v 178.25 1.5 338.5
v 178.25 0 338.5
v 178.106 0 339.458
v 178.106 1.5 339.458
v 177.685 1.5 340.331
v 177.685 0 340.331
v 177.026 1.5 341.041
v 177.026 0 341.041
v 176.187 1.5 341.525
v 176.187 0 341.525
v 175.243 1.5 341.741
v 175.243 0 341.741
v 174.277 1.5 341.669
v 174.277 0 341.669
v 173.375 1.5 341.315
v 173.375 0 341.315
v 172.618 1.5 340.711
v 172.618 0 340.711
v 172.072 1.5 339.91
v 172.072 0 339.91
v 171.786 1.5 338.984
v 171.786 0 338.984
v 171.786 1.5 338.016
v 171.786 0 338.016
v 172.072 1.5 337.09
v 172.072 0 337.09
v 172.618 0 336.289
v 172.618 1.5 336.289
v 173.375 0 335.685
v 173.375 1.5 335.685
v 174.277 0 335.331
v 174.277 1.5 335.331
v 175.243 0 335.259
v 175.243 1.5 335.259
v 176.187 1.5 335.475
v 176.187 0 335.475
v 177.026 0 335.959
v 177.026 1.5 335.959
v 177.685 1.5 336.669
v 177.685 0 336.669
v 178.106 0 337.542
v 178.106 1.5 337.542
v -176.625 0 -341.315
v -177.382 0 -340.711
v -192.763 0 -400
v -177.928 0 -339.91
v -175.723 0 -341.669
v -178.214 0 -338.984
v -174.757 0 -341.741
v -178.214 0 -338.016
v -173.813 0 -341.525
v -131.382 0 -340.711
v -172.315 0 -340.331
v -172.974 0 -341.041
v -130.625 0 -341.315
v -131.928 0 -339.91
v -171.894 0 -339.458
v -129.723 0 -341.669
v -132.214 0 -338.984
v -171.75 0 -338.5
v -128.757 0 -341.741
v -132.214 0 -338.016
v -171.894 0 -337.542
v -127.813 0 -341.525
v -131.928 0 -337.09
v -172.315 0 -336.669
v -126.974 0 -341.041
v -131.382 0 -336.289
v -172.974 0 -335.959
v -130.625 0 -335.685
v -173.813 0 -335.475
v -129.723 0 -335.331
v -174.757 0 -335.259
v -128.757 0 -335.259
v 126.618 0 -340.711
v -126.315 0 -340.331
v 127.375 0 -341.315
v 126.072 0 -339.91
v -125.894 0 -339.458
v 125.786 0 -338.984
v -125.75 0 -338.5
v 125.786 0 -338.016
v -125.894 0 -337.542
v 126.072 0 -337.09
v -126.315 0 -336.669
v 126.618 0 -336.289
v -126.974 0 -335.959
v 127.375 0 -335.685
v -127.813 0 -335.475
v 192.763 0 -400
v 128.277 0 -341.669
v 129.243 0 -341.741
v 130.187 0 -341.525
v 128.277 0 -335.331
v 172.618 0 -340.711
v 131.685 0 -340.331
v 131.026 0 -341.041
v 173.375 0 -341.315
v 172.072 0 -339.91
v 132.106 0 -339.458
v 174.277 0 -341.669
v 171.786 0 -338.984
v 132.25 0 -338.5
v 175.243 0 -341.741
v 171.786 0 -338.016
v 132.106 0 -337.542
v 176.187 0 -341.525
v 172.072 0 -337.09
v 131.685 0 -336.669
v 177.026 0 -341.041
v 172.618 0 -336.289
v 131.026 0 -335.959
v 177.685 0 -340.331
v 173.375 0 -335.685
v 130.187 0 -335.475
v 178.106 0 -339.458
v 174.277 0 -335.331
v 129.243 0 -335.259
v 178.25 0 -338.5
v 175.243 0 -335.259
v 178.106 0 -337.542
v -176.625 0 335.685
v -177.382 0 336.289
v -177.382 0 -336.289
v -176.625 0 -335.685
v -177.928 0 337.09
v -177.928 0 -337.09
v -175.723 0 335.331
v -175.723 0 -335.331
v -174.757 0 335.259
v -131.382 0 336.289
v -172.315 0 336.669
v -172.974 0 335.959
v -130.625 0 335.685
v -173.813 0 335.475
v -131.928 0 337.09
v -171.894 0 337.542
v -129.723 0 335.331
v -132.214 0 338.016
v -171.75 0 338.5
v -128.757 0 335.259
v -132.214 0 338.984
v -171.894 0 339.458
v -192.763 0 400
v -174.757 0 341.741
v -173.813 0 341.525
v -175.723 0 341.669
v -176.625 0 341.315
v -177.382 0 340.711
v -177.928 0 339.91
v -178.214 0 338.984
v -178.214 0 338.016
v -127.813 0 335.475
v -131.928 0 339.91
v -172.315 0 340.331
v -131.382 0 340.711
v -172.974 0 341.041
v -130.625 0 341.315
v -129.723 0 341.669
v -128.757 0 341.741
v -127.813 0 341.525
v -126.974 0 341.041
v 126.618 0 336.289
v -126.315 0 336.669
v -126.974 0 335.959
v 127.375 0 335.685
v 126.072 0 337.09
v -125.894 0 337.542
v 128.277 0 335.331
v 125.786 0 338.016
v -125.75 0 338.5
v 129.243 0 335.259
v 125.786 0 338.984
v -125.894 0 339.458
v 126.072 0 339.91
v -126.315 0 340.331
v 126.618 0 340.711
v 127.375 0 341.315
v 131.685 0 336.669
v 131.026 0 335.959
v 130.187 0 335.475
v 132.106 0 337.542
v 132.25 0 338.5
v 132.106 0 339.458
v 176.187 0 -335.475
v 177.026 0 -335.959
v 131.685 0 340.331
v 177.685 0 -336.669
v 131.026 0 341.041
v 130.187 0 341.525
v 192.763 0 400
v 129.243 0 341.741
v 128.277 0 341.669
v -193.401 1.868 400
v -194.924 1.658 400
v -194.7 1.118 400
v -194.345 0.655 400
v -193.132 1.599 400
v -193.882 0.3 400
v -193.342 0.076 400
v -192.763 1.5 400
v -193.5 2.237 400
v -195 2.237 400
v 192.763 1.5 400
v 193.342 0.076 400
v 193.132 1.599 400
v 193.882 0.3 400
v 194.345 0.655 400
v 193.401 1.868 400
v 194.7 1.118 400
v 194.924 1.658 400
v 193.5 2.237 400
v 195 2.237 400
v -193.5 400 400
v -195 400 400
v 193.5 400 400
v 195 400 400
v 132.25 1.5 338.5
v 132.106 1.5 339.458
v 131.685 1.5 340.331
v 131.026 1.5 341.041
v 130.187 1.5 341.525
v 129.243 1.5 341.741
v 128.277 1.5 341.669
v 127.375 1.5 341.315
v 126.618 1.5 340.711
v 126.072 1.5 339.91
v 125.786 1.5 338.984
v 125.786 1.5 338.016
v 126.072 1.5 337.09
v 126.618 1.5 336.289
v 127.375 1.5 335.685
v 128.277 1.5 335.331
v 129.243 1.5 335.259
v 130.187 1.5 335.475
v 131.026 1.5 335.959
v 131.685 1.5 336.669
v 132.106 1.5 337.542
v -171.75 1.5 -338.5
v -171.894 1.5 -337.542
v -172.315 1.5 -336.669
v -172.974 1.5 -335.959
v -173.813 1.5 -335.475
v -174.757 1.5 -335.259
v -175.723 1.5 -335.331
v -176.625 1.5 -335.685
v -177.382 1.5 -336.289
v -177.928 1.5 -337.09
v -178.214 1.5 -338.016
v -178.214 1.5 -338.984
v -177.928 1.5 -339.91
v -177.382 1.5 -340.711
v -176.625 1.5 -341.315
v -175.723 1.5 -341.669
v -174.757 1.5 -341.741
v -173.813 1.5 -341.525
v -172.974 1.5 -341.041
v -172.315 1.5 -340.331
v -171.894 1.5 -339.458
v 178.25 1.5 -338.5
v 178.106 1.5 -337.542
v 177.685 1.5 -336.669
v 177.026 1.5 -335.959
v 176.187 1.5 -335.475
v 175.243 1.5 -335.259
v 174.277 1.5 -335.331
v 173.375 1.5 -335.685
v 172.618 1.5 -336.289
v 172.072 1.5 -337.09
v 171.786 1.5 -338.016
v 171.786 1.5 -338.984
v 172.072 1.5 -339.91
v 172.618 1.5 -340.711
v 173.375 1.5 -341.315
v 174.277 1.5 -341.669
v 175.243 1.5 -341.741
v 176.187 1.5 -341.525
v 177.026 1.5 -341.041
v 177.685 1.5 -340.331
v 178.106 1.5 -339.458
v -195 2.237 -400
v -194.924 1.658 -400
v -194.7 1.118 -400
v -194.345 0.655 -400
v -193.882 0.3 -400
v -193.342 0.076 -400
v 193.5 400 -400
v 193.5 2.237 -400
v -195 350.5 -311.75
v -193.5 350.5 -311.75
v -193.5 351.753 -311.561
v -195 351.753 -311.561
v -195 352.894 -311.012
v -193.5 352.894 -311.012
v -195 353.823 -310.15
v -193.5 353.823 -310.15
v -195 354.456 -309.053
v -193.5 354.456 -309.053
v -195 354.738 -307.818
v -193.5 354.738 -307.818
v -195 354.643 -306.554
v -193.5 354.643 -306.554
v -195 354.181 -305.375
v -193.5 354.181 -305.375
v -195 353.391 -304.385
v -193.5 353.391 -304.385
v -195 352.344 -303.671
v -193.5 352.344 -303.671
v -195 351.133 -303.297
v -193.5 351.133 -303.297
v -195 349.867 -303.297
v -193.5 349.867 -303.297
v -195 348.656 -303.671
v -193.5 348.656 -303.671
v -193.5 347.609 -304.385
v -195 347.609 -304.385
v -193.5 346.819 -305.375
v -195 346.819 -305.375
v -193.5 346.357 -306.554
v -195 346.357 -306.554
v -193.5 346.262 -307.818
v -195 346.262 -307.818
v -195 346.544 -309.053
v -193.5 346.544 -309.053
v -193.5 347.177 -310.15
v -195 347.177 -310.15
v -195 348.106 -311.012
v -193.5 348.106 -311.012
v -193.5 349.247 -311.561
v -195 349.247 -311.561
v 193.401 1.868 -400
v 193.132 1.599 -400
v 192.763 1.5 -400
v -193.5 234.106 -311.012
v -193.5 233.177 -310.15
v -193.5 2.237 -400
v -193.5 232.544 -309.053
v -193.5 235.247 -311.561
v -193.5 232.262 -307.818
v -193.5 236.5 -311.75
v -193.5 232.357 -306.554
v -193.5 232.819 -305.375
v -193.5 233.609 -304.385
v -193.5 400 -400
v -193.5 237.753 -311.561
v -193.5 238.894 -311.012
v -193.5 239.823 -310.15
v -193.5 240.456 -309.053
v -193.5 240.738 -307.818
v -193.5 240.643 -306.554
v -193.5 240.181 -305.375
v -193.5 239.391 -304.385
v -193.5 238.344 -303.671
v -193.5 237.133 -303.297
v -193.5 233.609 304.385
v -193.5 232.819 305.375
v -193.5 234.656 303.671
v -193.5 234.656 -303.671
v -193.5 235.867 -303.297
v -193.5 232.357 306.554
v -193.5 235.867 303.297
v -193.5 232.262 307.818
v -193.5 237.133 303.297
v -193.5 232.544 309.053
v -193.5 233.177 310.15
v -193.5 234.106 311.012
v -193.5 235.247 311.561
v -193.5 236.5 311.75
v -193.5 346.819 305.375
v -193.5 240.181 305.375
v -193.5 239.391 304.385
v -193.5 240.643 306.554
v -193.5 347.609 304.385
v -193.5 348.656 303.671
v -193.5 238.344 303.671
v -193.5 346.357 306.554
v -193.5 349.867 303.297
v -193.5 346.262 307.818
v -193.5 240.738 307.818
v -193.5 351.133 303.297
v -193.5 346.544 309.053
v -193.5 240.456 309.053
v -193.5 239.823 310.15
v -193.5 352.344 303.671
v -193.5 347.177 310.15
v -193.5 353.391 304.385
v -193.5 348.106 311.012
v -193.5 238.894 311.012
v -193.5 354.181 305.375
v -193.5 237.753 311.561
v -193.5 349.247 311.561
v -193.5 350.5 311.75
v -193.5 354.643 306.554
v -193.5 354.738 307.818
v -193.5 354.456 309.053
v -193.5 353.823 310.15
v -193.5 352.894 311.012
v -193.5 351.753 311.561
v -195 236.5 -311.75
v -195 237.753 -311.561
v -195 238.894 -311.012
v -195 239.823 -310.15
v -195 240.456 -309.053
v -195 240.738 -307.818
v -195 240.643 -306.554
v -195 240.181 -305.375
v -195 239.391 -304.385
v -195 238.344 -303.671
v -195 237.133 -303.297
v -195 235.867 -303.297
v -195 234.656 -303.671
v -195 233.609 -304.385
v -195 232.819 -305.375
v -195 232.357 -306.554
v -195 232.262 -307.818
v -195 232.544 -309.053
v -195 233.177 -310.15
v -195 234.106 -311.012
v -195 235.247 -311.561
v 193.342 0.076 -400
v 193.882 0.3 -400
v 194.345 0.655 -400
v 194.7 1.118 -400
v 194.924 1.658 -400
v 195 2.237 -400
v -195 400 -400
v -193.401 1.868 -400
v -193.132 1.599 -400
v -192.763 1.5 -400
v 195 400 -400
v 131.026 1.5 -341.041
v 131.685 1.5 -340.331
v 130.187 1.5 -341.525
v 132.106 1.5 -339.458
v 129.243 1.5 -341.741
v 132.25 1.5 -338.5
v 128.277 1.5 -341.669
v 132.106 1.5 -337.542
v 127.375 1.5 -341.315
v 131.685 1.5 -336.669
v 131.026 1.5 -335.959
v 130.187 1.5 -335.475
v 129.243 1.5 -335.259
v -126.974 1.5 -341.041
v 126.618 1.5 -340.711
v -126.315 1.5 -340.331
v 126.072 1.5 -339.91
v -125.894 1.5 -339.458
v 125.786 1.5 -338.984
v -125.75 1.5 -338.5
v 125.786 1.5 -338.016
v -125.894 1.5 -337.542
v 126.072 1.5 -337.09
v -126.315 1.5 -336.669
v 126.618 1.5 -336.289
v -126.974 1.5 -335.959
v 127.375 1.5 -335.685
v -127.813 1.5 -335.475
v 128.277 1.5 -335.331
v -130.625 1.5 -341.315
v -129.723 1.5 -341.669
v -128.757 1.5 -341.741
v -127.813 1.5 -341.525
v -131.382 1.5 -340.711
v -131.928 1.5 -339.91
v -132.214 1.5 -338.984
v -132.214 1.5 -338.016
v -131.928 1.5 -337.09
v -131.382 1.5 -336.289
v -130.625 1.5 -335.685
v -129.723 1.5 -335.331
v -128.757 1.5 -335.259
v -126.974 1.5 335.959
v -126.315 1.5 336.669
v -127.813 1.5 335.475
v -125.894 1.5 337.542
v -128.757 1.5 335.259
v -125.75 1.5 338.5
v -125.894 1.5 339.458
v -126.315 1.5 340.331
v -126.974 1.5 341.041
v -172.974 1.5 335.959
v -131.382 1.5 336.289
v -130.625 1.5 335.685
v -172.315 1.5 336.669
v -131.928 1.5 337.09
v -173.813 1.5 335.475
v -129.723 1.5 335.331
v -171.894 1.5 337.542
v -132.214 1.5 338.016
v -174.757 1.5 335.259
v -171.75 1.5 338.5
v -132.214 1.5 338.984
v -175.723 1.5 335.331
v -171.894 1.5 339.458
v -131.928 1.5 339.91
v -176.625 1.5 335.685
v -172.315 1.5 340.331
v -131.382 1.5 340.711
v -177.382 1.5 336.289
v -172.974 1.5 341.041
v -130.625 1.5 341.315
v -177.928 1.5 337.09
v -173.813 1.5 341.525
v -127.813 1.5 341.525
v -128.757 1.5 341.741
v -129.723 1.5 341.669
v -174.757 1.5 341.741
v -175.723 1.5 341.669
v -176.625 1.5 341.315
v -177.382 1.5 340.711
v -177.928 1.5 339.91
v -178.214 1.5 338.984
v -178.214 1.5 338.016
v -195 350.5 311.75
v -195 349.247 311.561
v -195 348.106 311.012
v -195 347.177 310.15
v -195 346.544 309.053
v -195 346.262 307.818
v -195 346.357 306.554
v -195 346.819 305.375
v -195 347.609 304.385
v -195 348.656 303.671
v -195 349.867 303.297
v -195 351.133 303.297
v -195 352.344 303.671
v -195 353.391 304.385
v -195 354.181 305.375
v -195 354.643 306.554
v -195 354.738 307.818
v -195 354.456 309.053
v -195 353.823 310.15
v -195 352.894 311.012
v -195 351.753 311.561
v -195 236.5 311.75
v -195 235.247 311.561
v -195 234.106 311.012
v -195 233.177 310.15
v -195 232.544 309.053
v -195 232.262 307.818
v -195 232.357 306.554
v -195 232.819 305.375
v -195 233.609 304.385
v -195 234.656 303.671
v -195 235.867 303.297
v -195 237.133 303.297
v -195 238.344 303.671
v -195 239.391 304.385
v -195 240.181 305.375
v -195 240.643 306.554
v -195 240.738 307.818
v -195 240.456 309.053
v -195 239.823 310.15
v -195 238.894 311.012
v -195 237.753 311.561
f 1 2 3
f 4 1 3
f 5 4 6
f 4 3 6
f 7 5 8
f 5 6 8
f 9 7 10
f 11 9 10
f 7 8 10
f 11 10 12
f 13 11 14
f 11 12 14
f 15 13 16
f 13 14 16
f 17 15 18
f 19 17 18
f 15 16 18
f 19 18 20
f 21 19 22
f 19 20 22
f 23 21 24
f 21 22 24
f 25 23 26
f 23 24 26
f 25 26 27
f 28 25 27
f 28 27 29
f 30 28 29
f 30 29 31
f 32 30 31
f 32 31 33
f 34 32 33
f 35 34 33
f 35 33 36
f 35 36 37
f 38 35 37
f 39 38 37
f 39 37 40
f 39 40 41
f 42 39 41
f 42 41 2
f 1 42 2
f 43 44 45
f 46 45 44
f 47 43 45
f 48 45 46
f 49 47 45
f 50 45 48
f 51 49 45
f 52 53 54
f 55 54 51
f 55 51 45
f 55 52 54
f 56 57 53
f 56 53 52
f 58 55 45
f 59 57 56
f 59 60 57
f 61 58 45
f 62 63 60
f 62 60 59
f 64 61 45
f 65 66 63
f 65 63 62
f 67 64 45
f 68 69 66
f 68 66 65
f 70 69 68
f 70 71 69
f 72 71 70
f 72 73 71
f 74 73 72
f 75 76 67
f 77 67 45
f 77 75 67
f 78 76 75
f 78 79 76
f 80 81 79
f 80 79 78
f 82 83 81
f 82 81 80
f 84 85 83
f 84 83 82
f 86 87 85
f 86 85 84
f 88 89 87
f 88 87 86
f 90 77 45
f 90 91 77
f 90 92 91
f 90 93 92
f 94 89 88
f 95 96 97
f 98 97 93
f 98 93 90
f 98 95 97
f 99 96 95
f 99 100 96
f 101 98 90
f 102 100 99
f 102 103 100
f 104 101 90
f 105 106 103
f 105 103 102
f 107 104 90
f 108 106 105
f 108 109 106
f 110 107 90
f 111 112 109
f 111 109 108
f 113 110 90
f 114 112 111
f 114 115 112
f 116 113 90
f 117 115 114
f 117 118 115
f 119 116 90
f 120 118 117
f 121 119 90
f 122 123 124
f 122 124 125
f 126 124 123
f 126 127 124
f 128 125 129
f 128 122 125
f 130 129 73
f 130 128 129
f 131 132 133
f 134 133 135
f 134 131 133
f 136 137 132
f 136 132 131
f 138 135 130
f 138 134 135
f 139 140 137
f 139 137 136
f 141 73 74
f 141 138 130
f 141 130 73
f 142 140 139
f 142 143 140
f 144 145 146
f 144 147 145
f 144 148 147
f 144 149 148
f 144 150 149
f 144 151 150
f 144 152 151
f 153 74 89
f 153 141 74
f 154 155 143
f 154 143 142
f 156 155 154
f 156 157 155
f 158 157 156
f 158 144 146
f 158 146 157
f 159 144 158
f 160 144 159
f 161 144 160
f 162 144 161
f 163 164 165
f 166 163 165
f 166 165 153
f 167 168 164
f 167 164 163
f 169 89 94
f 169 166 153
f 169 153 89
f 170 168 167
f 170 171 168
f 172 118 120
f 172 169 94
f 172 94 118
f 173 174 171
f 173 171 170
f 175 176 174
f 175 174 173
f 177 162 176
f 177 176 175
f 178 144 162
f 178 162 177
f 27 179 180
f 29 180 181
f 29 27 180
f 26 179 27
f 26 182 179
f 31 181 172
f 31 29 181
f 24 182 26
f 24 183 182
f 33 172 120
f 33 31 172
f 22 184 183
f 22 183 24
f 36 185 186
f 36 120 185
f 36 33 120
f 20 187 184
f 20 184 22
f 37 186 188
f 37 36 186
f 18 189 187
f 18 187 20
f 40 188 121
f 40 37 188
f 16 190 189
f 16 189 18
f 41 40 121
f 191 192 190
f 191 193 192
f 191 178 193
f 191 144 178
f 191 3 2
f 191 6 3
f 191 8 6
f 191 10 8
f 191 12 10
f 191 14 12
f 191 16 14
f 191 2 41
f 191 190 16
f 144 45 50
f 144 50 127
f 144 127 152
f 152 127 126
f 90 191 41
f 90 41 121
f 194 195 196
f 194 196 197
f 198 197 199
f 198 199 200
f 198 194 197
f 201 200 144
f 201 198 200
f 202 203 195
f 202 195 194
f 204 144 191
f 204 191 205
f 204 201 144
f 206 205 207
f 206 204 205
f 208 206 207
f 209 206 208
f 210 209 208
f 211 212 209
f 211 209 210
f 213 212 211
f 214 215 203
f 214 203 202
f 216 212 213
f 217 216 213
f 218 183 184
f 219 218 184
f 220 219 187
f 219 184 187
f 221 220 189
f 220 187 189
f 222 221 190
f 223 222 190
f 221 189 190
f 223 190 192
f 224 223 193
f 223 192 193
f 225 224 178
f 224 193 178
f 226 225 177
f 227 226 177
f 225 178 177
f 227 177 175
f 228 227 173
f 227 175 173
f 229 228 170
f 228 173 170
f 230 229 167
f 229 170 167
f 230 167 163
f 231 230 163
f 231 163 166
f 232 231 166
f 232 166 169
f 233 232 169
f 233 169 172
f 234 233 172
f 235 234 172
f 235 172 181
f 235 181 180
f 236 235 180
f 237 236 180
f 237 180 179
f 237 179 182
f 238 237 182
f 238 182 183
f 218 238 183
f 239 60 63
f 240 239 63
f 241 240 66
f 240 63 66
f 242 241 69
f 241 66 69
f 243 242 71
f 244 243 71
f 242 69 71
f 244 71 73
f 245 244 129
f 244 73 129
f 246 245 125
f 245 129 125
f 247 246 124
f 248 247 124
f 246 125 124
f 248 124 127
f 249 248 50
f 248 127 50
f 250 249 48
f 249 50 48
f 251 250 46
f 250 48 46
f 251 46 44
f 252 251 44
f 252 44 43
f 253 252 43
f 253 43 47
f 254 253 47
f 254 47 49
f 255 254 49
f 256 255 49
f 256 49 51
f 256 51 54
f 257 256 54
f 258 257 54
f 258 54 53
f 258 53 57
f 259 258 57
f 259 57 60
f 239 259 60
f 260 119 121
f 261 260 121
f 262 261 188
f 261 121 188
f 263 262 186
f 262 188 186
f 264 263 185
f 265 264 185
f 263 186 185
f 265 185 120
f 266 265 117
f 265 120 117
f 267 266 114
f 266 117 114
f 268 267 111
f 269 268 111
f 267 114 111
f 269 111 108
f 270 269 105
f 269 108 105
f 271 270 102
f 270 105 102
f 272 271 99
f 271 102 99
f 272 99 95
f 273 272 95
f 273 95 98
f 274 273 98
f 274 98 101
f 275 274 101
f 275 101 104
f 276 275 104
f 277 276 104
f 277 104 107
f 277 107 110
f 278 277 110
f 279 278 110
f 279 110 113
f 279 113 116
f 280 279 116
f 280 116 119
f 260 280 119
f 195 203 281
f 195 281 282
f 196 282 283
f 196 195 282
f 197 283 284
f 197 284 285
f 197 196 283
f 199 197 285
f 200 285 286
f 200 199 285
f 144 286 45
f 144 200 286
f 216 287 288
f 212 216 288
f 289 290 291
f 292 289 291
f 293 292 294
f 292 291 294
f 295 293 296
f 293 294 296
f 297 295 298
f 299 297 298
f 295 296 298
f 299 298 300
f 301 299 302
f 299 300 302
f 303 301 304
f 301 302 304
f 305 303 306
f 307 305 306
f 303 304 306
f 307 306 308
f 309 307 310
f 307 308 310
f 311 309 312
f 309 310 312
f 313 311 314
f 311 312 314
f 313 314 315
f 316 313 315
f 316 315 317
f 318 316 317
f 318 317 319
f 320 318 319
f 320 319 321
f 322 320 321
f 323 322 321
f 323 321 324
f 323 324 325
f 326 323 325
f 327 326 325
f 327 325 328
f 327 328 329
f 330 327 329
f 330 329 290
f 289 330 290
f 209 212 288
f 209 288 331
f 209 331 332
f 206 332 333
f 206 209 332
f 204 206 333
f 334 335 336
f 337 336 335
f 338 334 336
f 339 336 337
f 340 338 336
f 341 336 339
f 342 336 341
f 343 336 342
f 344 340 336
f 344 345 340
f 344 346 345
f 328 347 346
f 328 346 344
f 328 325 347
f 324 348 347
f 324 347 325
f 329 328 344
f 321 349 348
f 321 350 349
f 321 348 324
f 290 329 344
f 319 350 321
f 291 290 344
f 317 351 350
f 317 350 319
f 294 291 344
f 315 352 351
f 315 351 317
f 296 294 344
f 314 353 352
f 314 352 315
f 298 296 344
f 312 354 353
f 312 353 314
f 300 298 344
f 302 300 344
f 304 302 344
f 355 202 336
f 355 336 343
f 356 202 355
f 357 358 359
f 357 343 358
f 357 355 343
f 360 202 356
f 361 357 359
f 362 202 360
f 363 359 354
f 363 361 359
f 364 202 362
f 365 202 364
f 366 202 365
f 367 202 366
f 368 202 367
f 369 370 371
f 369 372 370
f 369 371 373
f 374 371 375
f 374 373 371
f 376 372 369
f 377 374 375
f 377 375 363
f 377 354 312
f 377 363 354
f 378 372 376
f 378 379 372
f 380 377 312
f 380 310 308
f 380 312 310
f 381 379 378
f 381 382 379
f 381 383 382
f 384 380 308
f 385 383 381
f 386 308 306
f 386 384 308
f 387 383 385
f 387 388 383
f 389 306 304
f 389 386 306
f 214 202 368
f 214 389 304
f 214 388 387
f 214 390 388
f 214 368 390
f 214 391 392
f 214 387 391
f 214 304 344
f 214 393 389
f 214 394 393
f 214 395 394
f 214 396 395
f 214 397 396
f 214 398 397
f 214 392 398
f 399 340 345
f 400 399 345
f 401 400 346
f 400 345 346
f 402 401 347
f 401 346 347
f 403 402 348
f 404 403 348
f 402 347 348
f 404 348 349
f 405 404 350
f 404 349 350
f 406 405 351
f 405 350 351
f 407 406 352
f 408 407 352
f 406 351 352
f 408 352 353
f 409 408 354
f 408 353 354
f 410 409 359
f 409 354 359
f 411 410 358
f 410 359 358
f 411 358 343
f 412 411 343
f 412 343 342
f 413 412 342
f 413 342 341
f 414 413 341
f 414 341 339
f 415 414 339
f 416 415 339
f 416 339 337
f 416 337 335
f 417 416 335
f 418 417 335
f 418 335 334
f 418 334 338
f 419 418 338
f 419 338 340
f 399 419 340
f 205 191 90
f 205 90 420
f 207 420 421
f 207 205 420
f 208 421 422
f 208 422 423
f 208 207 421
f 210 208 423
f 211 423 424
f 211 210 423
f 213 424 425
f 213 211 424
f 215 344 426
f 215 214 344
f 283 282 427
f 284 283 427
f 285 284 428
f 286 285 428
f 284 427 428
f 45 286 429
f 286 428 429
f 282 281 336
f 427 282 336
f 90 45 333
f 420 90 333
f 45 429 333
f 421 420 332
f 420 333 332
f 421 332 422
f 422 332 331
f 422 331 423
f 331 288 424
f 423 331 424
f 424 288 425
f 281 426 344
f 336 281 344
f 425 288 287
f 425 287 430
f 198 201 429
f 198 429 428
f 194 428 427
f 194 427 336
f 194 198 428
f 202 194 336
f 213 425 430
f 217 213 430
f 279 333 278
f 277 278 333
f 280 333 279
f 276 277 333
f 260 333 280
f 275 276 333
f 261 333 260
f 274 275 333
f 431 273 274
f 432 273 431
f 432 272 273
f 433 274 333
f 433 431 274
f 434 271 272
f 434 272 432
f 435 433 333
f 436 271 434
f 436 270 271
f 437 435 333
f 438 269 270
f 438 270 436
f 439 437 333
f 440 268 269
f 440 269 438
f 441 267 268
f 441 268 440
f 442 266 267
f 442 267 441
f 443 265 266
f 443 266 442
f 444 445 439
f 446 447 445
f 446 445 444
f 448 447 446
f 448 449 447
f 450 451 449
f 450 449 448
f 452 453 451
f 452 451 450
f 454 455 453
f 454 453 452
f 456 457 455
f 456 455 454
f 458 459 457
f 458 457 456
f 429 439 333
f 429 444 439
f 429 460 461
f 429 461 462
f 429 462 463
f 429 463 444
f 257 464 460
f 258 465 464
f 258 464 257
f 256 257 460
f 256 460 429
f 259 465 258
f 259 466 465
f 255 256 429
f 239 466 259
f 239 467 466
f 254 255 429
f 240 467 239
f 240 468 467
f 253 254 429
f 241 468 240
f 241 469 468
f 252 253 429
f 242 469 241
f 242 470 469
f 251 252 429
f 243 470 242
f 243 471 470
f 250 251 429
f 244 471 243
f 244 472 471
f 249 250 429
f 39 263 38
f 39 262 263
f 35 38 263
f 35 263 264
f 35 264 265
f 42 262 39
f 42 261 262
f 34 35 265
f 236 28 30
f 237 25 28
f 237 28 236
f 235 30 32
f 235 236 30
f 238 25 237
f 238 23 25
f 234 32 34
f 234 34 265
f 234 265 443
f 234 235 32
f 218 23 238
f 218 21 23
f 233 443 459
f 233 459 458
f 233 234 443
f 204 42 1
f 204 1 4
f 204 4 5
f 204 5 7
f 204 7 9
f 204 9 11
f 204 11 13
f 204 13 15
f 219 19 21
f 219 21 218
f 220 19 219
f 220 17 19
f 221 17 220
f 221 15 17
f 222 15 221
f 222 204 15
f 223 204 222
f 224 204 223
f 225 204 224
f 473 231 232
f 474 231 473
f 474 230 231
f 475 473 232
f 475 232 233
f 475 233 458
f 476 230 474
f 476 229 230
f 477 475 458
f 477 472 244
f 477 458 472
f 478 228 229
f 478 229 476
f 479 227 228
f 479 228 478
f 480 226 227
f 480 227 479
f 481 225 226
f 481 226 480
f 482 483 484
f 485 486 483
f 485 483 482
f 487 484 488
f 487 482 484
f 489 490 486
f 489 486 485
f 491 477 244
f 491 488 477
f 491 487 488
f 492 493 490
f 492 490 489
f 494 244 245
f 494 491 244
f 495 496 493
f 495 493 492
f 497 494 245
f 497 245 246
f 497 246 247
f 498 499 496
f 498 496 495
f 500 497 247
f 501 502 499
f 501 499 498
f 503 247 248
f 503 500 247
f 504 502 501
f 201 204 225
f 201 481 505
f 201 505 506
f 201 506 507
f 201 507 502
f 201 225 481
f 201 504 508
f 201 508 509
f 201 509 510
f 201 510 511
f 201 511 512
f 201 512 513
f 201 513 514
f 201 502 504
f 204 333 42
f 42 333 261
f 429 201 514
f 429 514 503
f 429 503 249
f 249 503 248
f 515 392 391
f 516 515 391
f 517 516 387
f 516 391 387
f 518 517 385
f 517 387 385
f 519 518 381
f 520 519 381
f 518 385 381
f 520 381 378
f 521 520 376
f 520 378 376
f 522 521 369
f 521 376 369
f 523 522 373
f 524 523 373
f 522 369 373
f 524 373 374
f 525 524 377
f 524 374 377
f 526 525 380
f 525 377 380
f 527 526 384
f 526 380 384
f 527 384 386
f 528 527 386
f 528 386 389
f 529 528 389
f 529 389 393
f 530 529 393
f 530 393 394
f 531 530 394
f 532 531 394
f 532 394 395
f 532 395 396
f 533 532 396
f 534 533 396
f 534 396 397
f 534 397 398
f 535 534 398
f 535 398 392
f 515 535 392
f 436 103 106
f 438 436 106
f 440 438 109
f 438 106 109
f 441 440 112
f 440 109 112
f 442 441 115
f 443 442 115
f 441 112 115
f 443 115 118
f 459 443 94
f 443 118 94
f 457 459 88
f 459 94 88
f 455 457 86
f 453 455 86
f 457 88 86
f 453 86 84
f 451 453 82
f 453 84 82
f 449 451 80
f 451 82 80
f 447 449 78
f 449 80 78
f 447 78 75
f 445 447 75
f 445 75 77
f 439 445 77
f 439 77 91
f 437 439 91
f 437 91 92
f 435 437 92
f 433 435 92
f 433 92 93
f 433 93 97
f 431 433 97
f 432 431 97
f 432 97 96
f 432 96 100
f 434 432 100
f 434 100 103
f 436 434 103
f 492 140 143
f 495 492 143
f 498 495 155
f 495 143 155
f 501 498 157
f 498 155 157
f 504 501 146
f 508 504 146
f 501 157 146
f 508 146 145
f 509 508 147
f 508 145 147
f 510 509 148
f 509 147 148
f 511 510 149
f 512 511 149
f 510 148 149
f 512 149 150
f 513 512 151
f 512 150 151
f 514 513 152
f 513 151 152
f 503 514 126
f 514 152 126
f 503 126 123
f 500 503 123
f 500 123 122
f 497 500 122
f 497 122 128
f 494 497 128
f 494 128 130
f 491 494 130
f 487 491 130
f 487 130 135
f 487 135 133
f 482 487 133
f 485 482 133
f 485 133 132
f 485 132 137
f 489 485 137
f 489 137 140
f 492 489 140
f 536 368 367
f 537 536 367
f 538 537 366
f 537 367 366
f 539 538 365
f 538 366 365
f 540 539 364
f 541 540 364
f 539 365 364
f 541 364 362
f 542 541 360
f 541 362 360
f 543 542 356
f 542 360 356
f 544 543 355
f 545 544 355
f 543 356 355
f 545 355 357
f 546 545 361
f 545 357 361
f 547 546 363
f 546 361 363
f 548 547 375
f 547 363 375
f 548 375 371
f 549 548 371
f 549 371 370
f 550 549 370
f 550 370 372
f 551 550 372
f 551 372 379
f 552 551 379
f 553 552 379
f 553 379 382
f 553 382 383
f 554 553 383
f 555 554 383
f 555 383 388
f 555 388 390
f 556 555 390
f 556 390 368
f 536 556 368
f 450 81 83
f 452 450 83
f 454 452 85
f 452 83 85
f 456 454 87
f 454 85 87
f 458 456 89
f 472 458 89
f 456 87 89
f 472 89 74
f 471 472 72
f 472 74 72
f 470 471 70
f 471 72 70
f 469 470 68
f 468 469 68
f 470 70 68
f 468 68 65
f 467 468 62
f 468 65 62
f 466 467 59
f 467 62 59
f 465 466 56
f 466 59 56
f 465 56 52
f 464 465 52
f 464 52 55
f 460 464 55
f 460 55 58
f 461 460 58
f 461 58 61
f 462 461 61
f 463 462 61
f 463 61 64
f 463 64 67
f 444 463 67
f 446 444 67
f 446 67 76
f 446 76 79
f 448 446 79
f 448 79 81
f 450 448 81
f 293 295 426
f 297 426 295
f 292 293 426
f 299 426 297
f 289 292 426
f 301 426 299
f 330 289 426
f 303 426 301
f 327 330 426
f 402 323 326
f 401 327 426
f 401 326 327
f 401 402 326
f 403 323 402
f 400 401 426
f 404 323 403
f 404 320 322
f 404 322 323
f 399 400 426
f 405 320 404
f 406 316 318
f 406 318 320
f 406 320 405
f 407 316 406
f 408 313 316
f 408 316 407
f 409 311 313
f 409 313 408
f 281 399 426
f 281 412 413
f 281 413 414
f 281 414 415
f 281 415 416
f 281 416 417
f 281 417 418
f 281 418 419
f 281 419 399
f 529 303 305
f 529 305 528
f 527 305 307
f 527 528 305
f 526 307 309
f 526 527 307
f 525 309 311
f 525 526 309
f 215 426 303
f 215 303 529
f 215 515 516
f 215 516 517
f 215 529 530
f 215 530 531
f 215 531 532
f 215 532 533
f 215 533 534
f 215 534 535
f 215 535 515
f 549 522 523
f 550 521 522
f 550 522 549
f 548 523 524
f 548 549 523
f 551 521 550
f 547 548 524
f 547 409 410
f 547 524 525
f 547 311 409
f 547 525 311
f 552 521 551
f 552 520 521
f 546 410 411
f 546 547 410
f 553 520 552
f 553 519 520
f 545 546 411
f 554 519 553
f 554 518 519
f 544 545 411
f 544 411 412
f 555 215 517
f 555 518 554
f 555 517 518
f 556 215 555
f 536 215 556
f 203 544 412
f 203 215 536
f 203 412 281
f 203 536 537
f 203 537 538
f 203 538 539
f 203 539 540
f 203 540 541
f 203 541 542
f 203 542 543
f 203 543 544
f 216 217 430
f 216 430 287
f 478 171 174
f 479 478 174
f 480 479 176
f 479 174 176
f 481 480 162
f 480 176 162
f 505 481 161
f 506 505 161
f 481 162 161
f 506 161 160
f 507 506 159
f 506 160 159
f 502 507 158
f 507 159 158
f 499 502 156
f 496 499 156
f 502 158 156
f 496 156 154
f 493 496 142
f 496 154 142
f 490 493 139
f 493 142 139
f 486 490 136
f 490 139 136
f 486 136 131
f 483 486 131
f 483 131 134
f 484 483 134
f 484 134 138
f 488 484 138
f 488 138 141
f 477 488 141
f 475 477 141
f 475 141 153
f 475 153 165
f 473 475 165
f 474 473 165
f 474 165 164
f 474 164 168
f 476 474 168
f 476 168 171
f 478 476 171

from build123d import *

# Parameters (mm, degrees)
TABAN_FLAN_1_DEPTH    = 400
IZIM2_R               = 4.25
KES_EKSTR_ZYON1_DEPTH = 10
IZIM3_R               = 3.25
KES_EKSTR_ZYON2_DEPTH = 10


# Sheet-metal steps are written as plain solids
with BuildPart() as part:
    # Çizim1 → Taban-Flanş1 (new, symmetric)
    with BuildSketch(Plane.XY):
        with BuildLine():
            Line((-195, 400), (-195, 2.2366))
            ThreePointArc((-195, 2.2366), (-194.344915027, 0.655084973), (-192.7634, 0))
            Line((-192.7634, 0), (192.7634, 0))
            ThreePointArc((192.7634, 0), (194.344915027, 0.655084973), (195, 2.2366))
            Line((195, 2.2366), (195, 400))
            Line((195, 400), (193.5, 400))
            Line((193.5, 400), (193.5, 2.2366))
            ThreePointArc((193.5, 2.2366), (193.284254855, 1.715745145), (192.7634, 1.5))
            Line((192.7634, 1.5), (-192.7634, 1.5))
            ThreePointArc((-192.7634, 1.5), (-193.284254855, 1.715745145), (-193.5, 2.2366))
            Line((-193.5, 2.2366), (-193.5, 400))
            Line((-193.5, 400), (-195, 400))
        make_face()
    extrude(amount=TABAN_FLAN_1_DEPTH, both=True)

    # Çizim2 → Kes-Ekstrüzyon1 (cut)
    with BuildSketch(Plane(origin=(-193.5, 0, 0), x_dir=(0, 0, -1), z_dir=(1, 0, 0))):
        with Locations((307.5, 350.5)):
            Circle(IZIM2_R)
        with Locations((307.5, 236.5)):
            Circle(IZIM2_R)
        with Locations(Location((-307.5, 236.5, 0), (0, 0, 180))):
            Circle(IZIM2_R)
        with Locations(Location((-307.5, 350.5, 0), (0, 0, 180))):
            Circle(IZIM2_R)
    extrude(amount=-KES_EKSTR_ZYON1_DEPTH, mode=Mode.SUBTRACT)

    # Çizim3 → Kes-Ekstrüzyon2 (cut)
    with BuildSketch(Plane.XZ):
        with Locations((-175, 338.5)):
            Circle(IZIM3_R)
        with Locations((-129, 338.5)):
            Circle(IZIM3_R)
        with Locations((175, 338.5)):
            Circle(IZIM3_R)
        with Locations((129, 338.5)):
            Circle(IZIM3_R)
        with Locations((-175, -338.5)):
            Circle(IZIM3_R)
        with Locations((-129, -338.5)):
            Circle(IZIM3_R)
        with Locations((129, -338.5)):
            Circle(IZIM3_R)
        with Locations((175, -338.5)):
            Circle(IZIM3_R)
    extrude(amount=-KES_EKSTR_ZYON2_DEPTH, mode=Mode.SUBTRACT)


solid = part.part
